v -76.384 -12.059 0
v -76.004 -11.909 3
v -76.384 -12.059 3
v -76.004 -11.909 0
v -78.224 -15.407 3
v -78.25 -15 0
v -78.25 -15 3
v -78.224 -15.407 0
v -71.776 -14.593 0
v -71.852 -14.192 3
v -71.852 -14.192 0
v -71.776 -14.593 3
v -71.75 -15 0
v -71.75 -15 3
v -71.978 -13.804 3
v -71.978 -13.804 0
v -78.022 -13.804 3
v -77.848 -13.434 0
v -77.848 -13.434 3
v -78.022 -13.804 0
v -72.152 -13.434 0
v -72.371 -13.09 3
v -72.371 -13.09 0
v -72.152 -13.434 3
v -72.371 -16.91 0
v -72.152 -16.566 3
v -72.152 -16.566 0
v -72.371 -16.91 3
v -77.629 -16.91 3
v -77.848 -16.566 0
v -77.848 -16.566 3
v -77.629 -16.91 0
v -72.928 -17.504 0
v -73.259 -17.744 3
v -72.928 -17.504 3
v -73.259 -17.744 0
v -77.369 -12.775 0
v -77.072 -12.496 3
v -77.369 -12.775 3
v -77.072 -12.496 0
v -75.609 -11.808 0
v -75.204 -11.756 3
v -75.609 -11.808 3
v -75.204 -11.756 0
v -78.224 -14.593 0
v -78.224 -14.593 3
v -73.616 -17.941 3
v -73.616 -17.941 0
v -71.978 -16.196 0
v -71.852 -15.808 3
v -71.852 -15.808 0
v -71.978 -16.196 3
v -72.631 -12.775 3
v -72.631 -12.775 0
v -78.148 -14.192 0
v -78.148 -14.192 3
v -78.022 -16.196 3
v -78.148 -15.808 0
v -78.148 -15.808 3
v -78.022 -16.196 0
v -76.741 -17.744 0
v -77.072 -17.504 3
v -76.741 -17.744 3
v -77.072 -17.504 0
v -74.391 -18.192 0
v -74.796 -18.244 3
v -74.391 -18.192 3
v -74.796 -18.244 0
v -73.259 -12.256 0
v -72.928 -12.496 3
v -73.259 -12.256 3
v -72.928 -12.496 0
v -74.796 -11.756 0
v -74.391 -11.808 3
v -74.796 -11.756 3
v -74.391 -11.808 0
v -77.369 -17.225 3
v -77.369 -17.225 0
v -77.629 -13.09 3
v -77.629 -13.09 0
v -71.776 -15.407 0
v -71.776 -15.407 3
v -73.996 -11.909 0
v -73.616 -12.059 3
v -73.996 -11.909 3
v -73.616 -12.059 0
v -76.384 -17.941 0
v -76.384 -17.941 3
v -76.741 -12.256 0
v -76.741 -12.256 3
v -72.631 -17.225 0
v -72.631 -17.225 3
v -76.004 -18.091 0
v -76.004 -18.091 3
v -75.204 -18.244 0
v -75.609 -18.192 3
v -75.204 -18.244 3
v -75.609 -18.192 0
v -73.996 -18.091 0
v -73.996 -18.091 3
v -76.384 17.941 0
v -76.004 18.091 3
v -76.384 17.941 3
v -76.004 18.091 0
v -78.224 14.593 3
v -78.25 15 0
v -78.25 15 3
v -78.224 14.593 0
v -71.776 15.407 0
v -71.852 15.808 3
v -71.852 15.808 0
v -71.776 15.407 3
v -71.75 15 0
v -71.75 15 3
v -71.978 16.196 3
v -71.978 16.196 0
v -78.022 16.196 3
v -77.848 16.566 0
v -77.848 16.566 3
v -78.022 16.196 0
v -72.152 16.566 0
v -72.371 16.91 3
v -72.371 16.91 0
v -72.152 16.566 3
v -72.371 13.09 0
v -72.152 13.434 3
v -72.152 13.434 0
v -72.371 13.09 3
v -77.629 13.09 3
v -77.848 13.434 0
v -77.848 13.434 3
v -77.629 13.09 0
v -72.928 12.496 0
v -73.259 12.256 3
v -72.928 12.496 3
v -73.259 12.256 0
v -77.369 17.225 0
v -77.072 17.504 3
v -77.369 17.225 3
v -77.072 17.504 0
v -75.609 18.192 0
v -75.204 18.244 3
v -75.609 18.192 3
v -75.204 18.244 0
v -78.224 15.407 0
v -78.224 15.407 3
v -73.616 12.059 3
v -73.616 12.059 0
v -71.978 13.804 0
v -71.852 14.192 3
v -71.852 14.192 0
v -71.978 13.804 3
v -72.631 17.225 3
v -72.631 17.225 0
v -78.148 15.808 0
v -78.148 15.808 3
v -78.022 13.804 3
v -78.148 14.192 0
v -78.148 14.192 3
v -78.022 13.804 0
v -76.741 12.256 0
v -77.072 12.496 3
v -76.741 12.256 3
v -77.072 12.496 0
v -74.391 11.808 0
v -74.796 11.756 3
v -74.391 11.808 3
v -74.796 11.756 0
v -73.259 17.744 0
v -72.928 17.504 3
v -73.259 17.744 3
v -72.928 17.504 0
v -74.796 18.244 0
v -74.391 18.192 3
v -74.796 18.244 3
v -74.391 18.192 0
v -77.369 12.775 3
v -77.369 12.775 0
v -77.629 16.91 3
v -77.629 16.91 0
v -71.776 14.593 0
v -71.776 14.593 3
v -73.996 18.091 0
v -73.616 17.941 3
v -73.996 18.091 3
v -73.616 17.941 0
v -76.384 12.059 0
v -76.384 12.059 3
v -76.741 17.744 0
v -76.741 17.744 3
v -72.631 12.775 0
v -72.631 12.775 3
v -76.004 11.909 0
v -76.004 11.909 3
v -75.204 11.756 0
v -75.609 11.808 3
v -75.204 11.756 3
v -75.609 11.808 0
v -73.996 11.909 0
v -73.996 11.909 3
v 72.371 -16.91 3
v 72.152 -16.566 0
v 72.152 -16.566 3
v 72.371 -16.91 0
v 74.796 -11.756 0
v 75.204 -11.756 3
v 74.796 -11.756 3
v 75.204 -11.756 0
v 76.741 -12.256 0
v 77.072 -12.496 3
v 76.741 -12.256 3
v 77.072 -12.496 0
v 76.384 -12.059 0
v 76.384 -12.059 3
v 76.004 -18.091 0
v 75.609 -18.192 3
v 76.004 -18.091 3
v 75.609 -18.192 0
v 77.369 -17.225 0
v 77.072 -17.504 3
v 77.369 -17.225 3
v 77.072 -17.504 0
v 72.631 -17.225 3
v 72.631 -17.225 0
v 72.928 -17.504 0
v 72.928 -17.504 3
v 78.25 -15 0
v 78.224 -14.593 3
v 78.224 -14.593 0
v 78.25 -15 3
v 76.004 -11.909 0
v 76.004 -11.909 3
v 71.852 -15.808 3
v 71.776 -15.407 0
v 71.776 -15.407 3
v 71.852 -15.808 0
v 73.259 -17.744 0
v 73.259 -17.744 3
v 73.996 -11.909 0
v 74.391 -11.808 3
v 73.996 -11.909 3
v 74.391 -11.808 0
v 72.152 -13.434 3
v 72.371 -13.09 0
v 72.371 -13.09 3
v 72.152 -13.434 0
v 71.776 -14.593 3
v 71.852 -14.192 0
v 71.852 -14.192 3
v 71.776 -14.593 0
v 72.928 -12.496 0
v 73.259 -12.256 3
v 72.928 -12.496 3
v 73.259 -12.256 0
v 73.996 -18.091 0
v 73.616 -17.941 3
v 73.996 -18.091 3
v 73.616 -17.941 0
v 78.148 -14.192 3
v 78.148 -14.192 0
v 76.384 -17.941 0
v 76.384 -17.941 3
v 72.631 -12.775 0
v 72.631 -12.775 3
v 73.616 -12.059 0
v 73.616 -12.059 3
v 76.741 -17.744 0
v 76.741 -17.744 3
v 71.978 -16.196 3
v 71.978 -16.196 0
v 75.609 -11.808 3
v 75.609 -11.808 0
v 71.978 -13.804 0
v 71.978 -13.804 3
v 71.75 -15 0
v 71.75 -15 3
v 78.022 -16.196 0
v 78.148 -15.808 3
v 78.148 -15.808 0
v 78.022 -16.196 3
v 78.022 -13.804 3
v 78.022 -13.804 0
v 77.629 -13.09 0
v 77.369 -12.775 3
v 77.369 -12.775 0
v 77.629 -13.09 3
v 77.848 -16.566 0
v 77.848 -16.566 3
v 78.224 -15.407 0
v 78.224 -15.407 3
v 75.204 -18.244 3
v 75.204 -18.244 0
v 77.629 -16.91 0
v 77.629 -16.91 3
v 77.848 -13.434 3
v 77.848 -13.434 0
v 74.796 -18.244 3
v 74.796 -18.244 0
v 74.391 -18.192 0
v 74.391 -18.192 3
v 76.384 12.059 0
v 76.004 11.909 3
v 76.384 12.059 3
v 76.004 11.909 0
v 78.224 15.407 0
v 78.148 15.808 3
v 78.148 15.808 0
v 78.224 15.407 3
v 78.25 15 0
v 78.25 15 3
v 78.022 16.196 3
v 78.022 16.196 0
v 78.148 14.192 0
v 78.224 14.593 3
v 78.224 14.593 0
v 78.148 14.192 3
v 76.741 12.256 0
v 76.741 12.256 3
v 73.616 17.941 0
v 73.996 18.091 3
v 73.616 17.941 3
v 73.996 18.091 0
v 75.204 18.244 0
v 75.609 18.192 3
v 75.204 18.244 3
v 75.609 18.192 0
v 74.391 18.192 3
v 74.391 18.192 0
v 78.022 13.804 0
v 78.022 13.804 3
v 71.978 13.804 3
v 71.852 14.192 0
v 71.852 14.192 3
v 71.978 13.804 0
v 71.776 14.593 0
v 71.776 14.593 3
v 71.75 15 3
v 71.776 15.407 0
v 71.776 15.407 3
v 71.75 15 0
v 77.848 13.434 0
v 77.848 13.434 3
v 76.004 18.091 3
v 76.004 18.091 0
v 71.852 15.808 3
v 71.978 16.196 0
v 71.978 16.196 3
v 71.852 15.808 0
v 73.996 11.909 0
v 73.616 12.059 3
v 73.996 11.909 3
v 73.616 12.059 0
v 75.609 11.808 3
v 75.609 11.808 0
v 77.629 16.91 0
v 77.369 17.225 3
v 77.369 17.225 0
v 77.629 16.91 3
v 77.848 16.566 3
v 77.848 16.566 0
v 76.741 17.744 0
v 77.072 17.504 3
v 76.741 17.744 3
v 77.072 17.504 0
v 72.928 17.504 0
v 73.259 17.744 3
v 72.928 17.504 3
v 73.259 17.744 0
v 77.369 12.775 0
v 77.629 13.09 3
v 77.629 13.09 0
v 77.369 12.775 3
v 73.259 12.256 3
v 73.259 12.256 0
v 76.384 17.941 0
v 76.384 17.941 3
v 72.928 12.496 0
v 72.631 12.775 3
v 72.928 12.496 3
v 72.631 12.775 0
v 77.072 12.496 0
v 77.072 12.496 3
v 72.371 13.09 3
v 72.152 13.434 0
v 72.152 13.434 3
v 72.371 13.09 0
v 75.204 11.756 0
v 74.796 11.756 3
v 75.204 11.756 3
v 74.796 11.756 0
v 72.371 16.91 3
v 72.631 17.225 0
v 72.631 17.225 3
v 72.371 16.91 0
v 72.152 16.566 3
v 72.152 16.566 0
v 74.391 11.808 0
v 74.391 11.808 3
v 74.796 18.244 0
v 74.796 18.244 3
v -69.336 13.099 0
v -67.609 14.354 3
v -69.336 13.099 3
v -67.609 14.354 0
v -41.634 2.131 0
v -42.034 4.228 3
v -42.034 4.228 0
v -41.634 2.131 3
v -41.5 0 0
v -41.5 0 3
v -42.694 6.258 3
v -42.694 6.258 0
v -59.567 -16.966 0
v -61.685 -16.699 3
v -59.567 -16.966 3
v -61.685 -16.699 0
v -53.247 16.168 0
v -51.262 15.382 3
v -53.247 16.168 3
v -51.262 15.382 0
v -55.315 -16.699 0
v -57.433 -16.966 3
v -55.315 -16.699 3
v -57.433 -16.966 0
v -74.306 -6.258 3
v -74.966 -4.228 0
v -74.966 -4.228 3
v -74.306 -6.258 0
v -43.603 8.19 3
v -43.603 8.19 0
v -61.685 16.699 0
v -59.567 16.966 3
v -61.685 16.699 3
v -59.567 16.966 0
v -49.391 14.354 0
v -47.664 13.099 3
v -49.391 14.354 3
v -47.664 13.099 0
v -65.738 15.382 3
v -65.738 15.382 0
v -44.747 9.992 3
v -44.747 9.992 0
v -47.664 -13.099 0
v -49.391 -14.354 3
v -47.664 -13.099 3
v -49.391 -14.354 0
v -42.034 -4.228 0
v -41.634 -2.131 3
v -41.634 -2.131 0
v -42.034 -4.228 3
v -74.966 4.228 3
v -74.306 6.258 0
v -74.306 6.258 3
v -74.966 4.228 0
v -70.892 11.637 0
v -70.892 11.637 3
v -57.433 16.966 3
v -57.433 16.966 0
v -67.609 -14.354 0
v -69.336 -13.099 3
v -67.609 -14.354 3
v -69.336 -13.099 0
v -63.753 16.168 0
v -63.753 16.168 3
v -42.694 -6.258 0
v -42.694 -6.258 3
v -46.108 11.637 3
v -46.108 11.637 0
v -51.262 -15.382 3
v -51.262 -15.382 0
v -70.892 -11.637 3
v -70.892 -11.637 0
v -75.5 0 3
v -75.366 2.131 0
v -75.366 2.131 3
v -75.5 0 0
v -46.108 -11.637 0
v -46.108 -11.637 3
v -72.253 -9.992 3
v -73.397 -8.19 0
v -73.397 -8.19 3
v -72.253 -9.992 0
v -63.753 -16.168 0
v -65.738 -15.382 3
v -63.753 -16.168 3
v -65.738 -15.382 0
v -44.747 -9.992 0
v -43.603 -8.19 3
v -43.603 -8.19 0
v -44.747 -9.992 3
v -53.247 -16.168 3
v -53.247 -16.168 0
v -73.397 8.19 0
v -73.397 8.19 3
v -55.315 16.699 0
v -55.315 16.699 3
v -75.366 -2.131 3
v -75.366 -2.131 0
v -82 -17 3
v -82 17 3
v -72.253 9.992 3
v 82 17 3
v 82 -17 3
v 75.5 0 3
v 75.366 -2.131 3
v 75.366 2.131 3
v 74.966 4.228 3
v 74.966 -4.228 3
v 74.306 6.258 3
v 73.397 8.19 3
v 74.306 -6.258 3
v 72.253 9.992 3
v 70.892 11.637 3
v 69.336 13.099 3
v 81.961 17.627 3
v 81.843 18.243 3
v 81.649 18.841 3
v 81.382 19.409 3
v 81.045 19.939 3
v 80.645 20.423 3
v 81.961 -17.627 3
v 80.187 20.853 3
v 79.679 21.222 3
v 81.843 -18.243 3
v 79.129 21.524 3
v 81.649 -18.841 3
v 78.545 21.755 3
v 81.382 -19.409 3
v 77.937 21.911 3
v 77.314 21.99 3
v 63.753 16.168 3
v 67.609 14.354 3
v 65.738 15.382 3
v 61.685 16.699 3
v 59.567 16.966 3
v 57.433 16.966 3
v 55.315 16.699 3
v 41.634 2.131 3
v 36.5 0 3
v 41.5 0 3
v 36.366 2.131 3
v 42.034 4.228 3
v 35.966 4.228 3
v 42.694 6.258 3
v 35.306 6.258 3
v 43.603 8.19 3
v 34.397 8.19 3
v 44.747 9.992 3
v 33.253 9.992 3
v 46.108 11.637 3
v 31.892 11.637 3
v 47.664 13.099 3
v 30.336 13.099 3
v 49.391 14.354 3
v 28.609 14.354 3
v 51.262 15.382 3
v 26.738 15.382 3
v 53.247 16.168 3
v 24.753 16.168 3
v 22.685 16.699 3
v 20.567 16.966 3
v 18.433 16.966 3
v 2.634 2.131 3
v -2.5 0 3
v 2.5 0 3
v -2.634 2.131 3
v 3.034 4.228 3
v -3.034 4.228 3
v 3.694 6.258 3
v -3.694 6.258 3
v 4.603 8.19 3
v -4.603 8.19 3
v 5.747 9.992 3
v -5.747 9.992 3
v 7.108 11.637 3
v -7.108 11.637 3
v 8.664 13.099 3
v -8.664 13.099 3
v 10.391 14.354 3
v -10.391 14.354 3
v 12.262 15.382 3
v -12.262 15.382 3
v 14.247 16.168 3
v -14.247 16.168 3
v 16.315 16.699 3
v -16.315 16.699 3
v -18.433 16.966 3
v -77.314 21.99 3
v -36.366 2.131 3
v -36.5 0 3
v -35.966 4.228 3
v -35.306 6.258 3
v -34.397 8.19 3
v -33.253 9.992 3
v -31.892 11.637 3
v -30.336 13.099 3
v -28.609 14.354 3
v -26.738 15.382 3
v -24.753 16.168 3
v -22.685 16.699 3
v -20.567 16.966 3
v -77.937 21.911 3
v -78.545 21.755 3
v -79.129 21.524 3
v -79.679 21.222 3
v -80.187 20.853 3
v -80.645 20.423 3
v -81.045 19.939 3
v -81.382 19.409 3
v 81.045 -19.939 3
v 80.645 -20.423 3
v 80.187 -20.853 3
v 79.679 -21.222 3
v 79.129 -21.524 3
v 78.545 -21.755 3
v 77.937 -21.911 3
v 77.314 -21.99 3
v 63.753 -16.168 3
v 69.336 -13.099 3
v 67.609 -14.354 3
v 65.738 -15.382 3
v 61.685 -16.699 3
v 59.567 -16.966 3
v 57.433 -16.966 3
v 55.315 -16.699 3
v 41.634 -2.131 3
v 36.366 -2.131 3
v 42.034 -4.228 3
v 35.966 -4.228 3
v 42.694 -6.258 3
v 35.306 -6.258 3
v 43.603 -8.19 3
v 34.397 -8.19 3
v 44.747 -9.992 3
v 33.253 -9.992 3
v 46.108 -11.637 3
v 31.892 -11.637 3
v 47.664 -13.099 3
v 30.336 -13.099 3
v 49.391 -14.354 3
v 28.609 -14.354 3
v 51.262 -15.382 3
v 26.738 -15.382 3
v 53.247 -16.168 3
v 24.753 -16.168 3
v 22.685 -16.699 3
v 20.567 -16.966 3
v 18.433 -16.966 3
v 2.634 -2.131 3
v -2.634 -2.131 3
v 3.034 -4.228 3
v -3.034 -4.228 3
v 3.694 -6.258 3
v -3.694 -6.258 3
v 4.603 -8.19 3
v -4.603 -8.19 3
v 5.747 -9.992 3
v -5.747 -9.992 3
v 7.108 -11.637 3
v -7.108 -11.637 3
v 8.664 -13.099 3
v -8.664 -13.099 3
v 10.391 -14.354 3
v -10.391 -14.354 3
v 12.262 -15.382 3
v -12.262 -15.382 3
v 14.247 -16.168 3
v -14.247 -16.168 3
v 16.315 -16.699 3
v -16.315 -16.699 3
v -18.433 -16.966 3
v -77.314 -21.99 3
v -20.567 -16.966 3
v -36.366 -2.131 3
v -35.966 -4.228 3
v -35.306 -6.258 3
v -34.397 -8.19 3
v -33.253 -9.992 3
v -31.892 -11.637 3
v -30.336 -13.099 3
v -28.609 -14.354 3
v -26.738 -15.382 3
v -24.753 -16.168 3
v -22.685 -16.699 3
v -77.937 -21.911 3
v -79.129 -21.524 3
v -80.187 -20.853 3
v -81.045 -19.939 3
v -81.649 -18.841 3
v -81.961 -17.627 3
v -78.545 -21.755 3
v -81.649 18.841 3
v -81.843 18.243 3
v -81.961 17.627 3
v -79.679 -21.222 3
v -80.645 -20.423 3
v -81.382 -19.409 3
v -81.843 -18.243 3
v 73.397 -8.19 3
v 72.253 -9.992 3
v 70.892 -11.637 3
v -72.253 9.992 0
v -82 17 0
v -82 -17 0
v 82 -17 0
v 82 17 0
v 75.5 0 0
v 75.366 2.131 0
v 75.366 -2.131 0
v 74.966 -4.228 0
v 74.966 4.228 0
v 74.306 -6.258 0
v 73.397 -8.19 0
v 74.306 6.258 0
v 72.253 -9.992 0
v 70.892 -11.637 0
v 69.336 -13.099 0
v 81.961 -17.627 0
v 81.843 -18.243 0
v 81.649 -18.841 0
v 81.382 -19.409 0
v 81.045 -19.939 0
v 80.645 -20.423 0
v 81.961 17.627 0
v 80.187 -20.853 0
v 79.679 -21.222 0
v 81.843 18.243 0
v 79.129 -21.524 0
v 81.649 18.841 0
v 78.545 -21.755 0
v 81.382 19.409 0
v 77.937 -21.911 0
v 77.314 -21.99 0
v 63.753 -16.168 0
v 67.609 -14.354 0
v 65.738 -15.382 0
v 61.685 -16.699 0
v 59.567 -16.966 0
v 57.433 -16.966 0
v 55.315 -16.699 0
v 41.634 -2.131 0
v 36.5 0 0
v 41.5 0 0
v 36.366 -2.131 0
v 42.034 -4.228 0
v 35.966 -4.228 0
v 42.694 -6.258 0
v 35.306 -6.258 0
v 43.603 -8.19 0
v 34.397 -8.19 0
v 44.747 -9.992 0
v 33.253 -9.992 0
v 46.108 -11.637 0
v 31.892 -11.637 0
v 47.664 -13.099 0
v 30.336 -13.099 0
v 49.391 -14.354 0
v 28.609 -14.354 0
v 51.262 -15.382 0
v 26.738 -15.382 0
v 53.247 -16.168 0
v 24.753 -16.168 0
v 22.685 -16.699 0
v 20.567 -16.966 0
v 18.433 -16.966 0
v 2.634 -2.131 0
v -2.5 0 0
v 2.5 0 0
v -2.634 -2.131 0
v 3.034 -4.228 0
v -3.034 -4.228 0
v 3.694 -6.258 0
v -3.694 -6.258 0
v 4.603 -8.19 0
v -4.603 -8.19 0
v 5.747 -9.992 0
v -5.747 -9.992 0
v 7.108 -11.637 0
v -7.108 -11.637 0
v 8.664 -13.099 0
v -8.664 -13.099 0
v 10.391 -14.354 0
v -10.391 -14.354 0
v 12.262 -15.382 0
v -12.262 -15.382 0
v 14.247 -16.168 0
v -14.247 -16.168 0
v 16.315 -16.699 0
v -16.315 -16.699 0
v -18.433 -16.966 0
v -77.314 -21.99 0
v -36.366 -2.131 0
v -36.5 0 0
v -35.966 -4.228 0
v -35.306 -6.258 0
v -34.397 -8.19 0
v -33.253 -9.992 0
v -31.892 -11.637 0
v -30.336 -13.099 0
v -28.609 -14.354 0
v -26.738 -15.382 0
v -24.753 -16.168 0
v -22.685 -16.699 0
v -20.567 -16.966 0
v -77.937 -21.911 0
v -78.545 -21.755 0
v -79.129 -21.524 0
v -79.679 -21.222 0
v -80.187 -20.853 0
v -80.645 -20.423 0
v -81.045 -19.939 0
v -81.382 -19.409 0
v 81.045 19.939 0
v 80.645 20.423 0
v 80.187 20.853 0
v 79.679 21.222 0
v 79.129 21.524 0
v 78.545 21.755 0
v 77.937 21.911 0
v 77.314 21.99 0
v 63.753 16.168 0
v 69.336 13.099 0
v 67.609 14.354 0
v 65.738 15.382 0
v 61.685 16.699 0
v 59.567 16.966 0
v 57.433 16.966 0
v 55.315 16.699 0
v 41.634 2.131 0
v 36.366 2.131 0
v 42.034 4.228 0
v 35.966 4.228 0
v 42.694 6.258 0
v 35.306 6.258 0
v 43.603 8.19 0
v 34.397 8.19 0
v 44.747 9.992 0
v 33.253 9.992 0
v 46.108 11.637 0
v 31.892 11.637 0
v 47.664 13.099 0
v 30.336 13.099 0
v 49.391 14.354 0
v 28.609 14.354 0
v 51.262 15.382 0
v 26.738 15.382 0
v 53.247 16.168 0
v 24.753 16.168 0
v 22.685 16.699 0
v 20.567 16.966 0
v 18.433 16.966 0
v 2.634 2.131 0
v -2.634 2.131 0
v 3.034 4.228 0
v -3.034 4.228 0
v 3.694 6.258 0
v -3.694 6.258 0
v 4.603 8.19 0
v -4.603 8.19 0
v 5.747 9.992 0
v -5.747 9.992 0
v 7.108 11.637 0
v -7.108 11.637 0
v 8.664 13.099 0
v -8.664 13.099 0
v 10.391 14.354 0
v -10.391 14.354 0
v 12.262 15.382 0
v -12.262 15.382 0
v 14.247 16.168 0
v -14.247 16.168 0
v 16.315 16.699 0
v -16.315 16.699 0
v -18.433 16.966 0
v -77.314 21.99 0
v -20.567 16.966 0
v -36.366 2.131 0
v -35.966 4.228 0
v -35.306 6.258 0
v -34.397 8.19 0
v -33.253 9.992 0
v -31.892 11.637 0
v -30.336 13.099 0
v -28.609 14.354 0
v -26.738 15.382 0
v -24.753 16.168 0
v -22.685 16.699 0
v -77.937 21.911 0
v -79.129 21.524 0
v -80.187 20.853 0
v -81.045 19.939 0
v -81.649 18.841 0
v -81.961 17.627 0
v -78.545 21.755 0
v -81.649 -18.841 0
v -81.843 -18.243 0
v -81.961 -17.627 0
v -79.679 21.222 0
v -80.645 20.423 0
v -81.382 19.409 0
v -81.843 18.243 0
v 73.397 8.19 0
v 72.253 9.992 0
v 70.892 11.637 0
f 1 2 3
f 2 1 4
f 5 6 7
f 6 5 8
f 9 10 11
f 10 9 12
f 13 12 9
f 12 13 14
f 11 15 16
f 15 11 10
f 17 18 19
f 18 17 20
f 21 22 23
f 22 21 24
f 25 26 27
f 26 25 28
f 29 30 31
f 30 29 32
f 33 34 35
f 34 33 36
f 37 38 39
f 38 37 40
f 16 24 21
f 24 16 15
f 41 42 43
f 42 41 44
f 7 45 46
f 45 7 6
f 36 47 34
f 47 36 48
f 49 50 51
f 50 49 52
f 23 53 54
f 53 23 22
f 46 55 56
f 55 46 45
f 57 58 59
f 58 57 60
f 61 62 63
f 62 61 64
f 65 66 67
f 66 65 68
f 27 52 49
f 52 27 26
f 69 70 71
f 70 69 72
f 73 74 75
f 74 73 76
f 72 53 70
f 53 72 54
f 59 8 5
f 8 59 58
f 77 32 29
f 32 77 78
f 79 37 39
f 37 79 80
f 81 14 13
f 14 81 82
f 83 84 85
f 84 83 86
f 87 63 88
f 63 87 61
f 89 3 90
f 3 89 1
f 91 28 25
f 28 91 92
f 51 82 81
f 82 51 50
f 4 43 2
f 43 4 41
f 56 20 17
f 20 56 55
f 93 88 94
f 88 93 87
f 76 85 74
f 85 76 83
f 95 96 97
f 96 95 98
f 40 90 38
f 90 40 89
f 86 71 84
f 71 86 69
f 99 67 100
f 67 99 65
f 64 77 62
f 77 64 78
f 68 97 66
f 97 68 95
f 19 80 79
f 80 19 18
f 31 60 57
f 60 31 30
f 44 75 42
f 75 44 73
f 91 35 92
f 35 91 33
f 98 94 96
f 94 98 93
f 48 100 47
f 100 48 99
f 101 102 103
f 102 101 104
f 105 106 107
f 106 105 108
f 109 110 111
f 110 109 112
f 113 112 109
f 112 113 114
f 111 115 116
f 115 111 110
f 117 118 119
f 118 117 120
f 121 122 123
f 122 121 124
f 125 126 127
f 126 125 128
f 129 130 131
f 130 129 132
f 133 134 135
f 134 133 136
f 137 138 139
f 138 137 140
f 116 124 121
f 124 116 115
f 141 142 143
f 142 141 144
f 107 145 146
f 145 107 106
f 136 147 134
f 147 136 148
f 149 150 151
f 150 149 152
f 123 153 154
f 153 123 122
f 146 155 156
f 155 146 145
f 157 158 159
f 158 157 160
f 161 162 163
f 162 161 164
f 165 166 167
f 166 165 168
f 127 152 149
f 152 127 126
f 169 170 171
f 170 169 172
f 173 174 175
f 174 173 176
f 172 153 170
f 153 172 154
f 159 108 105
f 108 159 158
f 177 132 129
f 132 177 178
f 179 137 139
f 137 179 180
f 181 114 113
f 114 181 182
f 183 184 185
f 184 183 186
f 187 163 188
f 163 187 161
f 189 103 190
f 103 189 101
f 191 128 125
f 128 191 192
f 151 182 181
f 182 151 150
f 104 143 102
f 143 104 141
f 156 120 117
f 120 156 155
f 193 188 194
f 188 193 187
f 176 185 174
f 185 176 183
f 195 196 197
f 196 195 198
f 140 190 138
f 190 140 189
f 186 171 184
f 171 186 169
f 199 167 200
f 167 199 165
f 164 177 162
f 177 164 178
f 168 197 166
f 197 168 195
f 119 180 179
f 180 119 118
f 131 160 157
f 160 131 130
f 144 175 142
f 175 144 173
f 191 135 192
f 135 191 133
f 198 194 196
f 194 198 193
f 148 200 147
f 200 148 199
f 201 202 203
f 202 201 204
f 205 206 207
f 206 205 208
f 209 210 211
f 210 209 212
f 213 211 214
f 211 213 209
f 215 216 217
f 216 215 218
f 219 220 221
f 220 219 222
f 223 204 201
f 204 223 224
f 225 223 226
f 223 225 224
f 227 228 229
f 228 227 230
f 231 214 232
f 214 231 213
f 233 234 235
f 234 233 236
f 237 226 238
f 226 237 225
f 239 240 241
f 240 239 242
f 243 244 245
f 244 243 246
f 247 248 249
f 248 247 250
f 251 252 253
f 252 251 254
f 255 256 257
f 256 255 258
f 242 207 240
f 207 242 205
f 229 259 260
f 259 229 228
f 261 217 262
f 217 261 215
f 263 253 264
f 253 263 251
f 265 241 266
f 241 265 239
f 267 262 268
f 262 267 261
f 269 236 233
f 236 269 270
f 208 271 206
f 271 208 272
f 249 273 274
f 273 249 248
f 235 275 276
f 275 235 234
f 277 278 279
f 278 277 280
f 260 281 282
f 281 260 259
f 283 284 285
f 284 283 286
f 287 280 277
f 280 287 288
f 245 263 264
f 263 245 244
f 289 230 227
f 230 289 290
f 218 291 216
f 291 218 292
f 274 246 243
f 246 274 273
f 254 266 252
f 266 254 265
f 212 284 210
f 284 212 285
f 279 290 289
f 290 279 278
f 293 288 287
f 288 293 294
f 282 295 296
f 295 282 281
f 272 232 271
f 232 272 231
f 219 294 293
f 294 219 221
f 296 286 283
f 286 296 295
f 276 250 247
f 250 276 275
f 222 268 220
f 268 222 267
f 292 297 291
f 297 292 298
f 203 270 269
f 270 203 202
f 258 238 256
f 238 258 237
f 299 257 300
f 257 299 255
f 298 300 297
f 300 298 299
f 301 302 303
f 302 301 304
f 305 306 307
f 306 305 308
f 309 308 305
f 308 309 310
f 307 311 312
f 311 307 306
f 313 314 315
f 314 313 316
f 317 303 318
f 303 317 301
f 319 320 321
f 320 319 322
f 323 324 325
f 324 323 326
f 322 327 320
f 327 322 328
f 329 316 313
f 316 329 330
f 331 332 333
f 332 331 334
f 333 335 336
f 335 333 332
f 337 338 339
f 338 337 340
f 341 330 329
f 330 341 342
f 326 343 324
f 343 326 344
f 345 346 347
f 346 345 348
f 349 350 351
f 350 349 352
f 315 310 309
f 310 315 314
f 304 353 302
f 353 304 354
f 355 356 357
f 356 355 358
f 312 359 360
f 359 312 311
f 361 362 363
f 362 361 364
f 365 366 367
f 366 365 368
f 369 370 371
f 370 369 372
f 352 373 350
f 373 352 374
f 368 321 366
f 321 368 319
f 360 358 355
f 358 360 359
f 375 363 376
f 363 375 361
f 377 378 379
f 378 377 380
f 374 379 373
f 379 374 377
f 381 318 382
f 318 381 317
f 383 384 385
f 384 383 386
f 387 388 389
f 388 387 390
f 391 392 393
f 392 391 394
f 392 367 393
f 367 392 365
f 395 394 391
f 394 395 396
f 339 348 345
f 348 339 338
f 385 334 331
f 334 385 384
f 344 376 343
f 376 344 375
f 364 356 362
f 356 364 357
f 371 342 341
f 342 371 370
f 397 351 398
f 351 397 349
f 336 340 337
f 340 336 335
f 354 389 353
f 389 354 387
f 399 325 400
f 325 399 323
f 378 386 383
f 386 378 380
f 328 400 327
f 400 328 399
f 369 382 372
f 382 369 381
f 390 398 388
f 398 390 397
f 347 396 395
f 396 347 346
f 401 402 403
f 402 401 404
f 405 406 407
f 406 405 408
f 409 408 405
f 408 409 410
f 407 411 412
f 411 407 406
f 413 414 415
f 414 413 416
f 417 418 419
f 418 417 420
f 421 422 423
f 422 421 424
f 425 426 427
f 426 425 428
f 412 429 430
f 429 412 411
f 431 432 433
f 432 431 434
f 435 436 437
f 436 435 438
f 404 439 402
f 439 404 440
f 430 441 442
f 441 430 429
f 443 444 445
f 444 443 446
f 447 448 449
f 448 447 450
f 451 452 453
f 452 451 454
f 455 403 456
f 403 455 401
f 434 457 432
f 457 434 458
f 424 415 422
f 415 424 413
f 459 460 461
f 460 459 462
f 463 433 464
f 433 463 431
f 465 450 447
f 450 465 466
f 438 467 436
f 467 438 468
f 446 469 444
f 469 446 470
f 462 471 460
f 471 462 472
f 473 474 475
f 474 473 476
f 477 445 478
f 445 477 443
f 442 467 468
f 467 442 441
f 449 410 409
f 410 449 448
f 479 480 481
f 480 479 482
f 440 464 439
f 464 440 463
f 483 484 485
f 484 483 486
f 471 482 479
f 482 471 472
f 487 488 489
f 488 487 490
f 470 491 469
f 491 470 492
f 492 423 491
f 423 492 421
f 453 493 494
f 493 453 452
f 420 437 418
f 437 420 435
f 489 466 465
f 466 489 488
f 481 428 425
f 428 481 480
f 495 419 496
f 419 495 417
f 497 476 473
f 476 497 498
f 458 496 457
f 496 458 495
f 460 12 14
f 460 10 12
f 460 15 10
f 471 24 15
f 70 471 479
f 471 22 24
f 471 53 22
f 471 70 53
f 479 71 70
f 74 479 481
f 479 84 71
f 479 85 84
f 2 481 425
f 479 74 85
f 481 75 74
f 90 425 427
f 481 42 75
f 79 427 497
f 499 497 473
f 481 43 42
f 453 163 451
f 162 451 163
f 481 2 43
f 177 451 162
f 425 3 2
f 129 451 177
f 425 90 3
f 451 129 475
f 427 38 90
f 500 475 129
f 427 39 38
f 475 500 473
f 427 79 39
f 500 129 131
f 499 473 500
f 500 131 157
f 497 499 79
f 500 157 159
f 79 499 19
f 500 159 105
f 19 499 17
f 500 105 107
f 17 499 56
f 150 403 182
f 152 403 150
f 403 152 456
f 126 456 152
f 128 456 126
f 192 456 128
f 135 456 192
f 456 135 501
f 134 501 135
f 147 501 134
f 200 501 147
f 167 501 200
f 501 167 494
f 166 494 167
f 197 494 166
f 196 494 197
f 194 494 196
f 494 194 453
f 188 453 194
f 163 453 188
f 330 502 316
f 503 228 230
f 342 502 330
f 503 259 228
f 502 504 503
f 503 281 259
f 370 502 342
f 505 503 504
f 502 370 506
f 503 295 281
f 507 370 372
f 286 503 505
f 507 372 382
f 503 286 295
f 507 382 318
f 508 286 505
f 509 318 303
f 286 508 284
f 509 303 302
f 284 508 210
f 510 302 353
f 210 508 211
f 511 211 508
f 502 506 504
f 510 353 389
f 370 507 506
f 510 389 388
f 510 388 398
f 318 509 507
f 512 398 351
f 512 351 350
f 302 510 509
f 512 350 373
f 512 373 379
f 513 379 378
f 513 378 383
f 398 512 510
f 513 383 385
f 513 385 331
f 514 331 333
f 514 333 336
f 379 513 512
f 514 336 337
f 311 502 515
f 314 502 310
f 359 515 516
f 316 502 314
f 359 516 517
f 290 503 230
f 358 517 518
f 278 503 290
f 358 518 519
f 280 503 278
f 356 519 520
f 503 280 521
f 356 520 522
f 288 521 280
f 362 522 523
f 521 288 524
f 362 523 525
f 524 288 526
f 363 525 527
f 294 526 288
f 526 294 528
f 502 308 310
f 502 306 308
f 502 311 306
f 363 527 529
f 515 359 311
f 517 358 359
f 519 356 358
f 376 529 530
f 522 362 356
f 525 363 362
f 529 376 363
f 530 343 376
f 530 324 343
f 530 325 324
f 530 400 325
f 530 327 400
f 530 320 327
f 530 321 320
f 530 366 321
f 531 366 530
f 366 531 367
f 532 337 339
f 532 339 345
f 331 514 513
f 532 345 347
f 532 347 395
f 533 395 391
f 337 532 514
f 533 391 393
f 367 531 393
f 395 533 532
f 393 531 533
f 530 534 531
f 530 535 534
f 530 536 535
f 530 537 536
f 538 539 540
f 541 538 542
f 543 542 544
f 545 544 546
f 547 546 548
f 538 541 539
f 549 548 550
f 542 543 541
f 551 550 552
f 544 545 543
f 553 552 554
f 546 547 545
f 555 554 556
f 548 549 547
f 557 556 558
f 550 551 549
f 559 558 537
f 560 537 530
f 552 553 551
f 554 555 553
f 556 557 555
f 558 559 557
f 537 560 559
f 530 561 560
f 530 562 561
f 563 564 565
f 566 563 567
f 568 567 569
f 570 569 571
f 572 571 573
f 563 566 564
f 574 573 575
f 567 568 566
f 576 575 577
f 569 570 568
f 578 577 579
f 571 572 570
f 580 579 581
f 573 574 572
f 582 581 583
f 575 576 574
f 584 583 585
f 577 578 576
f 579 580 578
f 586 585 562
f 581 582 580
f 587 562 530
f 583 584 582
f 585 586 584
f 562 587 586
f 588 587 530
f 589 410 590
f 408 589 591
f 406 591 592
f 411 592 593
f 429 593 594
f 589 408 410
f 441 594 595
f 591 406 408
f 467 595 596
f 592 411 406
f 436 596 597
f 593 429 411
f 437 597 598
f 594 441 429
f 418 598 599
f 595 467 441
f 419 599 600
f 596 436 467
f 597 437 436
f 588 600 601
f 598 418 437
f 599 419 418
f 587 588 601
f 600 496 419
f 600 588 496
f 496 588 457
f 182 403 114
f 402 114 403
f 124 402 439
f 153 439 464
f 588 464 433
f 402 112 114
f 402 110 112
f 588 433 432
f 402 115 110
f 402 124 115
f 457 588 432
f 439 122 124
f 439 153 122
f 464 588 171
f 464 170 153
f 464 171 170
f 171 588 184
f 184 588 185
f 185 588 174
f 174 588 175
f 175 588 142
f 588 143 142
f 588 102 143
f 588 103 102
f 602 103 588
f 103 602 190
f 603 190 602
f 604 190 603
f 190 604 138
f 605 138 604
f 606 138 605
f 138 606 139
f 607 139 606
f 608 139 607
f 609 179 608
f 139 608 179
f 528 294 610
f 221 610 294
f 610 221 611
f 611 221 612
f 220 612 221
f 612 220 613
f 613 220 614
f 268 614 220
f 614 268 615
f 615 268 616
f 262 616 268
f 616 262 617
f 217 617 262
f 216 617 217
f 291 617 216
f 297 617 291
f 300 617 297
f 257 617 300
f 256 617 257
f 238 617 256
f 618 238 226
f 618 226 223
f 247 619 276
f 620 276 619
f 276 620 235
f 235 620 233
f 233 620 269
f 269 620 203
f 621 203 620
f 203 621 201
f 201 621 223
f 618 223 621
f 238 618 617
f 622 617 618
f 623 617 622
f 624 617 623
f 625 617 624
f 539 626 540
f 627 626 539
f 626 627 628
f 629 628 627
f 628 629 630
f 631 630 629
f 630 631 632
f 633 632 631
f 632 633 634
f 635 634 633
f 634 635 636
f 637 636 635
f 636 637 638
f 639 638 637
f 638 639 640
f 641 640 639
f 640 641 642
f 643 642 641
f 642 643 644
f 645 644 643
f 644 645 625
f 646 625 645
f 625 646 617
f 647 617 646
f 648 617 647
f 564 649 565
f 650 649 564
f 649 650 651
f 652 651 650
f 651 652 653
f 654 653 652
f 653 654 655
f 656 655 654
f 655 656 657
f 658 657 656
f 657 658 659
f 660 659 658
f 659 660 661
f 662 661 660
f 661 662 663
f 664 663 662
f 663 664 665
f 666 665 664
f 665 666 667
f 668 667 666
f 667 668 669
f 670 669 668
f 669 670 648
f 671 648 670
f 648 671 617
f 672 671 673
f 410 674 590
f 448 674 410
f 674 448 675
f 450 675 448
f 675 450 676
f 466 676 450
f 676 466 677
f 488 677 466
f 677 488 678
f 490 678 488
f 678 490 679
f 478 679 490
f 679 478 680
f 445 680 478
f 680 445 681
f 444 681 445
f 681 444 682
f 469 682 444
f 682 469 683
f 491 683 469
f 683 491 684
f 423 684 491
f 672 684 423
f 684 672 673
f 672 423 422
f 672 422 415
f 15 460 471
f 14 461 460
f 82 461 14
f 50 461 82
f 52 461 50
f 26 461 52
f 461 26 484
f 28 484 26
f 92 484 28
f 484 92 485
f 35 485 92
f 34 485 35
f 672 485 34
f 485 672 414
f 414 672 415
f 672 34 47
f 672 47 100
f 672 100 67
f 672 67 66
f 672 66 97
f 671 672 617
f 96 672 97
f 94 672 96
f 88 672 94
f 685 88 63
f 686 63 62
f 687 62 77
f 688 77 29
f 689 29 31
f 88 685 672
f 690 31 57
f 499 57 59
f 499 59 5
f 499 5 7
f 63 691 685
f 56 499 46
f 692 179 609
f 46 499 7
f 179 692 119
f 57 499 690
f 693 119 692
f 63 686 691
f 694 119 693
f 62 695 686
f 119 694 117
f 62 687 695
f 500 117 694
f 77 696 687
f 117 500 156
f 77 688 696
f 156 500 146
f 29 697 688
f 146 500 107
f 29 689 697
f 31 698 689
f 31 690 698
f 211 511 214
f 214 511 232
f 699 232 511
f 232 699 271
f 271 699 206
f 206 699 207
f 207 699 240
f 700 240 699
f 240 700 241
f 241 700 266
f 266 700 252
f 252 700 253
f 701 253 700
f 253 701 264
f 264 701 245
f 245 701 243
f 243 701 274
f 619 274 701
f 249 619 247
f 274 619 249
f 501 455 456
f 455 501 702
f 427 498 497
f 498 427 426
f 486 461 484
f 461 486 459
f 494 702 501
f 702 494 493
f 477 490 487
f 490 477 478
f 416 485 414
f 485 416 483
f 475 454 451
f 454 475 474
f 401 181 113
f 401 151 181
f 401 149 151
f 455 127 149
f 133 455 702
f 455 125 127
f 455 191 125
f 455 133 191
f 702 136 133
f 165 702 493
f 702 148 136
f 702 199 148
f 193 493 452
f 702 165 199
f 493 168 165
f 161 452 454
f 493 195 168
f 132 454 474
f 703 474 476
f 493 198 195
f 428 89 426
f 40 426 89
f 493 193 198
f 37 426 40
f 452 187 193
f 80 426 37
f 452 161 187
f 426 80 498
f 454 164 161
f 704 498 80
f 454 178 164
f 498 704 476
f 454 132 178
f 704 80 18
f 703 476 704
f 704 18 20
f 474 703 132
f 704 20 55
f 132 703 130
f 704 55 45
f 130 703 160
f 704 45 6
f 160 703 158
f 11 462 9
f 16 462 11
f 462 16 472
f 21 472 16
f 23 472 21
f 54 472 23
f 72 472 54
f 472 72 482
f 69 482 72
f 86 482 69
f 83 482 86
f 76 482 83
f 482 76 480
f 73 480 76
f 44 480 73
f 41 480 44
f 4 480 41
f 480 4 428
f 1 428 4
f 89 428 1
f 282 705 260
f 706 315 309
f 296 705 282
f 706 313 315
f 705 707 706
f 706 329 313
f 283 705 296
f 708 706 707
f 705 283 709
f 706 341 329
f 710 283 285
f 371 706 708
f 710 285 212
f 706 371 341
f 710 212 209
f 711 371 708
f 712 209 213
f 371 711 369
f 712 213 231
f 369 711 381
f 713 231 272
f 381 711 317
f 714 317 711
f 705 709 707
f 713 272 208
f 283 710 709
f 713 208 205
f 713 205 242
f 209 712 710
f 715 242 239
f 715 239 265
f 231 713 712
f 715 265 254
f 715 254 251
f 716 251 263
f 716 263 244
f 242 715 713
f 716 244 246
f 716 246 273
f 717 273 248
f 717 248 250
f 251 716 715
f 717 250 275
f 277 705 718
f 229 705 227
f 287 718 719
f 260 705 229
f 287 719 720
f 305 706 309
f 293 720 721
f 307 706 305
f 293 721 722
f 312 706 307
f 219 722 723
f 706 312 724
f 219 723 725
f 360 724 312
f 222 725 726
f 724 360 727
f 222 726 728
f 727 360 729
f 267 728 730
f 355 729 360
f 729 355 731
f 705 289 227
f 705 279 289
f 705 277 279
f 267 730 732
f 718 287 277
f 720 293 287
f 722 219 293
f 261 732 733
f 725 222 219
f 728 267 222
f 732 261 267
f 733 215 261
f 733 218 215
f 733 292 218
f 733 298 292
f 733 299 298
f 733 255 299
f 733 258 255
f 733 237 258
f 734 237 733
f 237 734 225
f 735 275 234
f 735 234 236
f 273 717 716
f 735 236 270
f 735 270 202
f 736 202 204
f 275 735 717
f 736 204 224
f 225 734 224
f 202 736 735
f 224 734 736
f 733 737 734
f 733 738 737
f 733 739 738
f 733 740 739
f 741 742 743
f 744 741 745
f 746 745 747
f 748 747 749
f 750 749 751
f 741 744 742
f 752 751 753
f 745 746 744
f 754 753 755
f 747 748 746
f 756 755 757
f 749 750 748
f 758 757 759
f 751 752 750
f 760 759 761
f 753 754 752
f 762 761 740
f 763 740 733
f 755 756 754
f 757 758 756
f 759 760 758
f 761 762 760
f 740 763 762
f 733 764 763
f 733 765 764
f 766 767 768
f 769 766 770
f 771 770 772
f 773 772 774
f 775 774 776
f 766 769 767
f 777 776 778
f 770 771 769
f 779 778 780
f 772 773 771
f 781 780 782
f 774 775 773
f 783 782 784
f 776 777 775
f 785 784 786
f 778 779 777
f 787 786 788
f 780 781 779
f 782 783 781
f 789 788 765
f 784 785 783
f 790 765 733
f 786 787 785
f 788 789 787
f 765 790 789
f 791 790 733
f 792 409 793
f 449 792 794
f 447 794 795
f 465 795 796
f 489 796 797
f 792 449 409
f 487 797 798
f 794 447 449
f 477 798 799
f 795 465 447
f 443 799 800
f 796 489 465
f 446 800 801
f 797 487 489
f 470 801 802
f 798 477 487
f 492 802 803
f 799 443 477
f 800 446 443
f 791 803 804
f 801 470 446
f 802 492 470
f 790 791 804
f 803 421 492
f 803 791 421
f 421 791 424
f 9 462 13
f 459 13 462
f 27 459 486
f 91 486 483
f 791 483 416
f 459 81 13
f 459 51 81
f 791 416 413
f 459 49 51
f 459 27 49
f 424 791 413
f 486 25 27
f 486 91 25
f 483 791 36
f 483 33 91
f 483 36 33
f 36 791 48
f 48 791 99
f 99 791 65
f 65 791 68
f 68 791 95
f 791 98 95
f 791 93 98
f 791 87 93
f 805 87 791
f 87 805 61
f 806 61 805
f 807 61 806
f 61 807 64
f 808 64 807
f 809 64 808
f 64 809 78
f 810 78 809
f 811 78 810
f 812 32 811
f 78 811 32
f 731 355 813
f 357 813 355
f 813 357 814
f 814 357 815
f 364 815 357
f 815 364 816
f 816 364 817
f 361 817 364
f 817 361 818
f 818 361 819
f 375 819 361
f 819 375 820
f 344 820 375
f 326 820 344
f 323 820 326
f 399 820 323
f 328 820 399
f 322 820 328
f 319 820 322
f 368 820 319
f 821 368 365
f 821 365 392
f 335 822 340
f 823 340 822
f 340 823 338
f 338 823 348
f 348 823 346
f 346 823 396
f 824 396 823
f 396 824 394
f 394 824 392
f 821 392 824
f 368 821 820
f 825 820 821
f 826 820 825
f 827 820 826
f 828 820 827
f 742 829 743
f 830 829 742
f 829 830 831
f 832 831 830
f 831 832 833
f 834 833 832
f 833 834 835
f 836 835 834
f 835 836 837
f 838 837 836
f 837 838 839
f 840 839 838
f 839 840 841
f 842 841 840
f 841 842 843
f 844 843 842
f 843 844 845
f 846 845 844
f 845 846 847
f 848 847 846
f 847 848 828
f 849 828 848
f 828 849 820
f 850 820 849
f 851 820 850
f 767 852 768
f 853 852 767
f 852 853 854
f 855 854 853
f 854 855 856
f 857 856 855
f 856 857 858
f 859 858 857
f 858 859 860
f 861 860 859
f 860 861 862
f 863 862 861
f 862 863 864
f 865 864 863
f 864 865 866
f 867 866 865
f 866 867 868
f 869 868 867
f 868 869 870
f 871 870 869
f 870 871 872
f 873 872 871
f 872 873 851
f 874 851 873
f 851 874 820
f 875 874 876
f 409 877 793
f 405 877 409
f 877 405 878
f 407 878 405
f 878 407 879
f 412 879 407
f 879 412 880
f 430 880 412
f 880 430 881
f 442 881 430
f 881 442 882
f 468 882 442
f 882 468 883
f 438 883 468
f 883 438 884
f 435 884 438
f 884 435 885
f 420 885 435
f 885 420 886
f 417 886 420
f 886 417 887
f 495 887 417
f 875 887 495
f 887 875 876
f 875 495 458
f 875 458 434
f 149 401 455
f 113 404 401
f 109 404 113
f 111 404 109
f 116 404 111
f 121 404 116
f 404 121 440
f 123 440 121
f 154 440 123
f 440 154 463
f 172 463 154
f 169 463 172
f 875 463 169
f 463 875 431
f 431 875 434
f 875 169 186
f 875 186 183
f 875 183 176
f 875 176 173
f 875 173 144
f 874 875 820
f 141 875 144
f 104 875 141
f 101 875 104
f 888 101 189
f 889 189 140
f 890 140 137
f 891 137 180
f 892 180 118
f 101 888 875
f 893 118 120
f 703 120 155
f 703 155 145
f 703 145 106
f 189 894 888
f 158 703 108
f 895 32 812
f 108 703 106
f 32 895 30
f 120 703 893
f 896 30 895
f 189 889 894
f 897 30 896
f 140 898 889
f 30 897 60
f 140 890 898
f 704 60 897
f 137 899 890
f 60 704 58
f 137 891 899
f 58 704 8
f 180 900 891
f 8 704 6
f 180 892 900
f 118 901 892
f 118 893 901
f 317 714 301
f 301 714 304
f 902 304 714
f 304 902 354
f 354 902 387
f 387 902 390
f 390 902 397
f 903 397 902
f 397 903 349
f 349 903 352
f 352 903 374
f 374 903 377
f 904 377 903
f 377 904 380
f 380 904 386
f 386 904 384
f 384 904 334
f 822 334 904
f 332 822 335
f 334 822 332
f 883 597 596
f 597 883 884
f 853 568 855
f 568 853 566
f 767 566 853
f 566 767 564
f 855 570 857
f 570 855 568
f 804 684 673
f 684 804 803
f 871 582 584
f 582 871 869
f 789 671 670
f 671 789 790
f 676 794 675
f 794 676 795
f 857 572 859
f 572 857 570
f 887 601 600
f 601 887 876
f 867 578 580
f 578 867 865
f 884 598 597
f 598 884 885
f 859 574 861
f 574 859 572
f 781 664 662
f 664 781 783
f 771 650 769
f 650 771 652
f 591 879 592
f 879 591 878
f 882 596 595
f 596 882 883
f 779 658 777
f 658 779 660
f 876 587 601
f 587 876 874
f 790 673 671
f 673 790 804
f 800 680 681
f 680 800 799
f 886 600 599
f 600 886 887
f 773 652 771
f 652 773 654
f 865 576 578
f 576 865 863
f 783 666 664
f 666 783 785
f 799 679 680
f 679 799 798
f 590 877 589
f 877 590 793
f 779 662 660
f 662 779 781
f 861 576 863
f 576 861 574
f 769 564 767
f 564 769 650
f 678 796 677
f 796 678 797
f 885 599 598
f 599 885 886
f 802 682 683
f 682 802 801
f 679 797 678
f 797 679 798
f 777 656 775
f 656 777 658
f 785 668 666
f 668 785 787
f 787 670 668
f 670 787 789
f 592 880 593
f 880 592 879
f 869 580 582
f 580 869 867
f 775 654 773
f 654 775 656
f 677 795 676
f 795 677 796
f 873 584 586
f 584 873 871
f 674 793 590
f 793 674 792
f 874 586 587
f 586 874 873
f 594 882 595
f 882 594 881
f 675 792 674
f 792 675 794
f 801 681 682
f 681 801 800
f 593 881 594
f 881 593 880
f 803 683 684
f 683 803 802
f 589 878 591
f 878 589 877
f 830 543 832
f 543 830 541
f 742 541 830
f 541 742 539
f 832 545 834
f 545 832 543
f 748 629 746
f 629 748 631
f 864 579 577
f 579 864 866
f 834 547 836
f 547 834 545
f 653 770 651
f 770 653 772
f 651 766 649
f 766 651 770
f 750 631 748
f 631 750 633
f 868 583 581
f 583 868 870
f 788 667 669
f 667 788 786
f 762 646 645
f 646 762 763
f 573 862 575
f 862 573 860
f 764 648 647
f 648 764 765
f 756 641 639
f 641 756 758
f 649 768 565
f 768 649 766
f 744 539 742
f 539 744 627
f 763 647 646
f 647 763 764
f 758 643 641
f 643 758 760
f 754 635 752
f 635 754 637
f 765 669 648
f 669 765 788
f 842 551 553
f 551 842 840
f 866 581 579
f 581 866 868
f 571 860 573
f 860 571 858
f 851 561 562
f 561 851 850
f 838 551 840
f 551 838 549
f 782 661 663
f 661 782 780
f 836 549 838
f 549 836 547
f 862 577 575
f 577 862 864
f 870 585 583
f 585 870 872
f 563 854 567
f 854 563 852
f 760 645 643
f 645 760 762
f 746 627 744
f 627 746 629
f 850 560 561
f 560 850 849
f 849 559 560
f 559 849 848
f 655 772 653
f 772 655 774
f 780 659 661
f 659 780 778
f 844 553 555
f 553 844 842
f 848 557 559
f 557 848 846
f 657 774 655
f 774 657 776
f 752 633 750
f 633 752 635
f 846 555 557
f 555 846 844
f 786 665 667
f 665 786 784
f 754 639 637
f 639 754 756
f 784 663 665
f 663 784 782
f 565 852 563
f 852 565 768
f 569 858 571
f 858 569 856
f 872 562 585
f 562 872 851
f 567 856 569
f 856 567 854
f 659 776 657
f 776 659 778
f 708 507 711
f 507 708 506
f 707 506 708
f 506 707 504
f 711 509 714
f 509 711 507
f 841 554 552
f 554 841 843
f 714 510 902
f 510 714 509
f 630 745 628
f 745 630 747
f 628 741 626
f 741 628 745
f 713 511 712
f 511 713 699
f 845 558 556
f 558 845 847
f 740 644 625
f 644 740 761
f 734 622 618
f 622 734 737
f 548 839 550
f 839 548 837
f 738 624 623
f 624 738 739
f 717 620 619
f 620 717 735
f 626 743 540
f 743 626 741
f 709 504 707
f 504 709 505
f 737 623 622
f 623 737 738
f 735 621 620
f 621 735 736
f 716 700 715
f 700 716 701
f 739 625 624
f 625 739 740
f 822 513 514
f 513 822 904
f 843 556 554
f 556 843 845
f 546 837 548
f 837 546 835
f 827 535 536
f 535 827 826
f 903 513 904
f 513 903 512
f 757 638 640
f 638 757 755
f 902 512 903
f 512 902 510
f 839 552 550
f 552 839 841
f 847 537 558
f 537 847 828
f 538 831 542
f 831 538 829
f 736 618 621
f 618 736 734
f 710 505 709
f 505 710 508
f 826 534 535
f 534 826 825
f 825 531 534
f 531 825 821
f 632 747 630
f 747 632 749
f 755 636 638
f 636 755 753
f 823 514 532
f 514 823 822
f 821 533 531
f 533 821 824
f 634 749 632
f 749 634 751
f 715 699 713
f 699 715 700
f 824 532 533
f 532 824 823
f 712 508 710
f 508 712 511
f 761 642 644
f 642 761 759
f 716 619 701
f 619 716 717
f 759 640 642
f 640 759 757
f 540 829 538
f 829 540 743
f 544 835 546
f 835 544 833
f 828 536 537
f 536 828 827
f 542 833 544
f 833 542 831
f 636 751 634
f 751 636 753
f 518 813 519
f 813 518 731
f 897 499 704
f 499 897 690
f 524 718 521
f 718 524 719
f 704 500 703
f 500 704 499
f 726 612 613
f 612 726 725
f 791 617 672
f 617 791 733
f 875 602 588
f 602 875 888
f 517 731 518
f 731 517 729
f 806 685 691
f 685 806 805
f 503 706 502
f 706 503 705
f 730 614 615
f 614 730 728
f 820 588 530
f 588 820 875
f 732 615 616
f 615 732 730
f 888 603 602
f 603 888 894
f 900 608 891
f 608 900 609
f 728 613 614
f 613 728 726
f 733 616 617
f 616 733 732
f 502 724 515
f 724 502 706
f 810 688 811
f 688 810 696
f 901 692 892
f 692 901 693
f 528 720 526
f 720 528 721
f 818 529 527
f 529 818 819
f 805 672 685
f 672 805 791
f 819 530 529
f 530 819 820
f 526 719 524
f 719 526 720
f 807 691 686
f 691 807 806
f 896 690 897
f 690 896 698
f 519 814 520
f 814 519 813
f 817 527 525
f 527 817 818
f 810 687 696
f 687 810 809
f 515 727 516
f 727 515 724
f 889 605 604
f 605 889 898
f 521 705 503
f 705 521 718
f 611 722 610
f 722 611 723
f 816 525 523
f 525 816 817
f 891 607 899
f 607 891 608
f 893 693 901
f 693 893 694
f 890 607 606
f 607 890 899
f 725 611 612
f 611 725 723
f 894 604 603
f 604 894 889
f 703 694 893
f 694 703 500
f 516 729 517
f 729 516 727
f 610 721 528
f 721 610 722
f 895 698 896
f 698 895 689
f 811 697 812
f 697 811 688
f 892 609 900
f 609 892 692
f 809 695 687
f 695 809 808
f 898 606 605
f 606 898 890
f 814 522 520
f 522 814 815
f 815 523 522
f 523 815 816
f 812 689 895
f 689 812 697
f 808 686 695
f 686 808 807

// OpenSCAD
$fn = 50;


difference() {
	union() {
		hull() {
			translate(v = [-77.0000000000, 17.0000000000, 0]) {
				cylinder(h = 3, r = 5);
			}
			translate(v = [77.0000000000, 17.0000000000, 0]) {
				cylinder(h = 3, r = 5);
			}
			translate(v = [-77.0000000000, -17.0000000000, 0]) {
				cylinder(h = 3, r = 5);
			}
			translate(v = [77.0000000000, -17.0000000000, 0]) {
				cylinder(h = 3, r = 5);
			}
		}
	}
	union() {
		#translate(v = [-75.0000000000, -15.0000000000, -100.0000000000]) {
			cylinder(h = 200, r = 3.2500000000);
		}
		#translate(v = [-75.0000000000, 15.0000000000, -100.0000000000]) {
			cylinder(h = 200, r = 3.2500000000);
		}
		#translate(v = [75.0000000000, -15.0000000000, -100.0000000000]) {
			cylinder(h = 200, r = 3.2500000000);
		}
		#translate(v = [75.0000000000, 15.0000000000, -100.0000000000]) {
			cylinder(h = 200, r = 3.2500000000);
		}
		#translate(v = [-58.5000000000, 0, 0]) {
			cylinder(h = 3, r = 17.0000000000);
		}
		#translate(v = [-19.5000000000, 0, 0]) {
			cylinder(h = 3, r = 17.0000000000);
		}
		#translate(v = [19.5000000000, 0, 0]) {
			cylinder(h = 3, r = 17.0000000000);
		}
		#translate(v = [58.5000000000, 0, 0]) {
			cylinder(h = 3, r = 17.0000000000);
		}
	}
}
